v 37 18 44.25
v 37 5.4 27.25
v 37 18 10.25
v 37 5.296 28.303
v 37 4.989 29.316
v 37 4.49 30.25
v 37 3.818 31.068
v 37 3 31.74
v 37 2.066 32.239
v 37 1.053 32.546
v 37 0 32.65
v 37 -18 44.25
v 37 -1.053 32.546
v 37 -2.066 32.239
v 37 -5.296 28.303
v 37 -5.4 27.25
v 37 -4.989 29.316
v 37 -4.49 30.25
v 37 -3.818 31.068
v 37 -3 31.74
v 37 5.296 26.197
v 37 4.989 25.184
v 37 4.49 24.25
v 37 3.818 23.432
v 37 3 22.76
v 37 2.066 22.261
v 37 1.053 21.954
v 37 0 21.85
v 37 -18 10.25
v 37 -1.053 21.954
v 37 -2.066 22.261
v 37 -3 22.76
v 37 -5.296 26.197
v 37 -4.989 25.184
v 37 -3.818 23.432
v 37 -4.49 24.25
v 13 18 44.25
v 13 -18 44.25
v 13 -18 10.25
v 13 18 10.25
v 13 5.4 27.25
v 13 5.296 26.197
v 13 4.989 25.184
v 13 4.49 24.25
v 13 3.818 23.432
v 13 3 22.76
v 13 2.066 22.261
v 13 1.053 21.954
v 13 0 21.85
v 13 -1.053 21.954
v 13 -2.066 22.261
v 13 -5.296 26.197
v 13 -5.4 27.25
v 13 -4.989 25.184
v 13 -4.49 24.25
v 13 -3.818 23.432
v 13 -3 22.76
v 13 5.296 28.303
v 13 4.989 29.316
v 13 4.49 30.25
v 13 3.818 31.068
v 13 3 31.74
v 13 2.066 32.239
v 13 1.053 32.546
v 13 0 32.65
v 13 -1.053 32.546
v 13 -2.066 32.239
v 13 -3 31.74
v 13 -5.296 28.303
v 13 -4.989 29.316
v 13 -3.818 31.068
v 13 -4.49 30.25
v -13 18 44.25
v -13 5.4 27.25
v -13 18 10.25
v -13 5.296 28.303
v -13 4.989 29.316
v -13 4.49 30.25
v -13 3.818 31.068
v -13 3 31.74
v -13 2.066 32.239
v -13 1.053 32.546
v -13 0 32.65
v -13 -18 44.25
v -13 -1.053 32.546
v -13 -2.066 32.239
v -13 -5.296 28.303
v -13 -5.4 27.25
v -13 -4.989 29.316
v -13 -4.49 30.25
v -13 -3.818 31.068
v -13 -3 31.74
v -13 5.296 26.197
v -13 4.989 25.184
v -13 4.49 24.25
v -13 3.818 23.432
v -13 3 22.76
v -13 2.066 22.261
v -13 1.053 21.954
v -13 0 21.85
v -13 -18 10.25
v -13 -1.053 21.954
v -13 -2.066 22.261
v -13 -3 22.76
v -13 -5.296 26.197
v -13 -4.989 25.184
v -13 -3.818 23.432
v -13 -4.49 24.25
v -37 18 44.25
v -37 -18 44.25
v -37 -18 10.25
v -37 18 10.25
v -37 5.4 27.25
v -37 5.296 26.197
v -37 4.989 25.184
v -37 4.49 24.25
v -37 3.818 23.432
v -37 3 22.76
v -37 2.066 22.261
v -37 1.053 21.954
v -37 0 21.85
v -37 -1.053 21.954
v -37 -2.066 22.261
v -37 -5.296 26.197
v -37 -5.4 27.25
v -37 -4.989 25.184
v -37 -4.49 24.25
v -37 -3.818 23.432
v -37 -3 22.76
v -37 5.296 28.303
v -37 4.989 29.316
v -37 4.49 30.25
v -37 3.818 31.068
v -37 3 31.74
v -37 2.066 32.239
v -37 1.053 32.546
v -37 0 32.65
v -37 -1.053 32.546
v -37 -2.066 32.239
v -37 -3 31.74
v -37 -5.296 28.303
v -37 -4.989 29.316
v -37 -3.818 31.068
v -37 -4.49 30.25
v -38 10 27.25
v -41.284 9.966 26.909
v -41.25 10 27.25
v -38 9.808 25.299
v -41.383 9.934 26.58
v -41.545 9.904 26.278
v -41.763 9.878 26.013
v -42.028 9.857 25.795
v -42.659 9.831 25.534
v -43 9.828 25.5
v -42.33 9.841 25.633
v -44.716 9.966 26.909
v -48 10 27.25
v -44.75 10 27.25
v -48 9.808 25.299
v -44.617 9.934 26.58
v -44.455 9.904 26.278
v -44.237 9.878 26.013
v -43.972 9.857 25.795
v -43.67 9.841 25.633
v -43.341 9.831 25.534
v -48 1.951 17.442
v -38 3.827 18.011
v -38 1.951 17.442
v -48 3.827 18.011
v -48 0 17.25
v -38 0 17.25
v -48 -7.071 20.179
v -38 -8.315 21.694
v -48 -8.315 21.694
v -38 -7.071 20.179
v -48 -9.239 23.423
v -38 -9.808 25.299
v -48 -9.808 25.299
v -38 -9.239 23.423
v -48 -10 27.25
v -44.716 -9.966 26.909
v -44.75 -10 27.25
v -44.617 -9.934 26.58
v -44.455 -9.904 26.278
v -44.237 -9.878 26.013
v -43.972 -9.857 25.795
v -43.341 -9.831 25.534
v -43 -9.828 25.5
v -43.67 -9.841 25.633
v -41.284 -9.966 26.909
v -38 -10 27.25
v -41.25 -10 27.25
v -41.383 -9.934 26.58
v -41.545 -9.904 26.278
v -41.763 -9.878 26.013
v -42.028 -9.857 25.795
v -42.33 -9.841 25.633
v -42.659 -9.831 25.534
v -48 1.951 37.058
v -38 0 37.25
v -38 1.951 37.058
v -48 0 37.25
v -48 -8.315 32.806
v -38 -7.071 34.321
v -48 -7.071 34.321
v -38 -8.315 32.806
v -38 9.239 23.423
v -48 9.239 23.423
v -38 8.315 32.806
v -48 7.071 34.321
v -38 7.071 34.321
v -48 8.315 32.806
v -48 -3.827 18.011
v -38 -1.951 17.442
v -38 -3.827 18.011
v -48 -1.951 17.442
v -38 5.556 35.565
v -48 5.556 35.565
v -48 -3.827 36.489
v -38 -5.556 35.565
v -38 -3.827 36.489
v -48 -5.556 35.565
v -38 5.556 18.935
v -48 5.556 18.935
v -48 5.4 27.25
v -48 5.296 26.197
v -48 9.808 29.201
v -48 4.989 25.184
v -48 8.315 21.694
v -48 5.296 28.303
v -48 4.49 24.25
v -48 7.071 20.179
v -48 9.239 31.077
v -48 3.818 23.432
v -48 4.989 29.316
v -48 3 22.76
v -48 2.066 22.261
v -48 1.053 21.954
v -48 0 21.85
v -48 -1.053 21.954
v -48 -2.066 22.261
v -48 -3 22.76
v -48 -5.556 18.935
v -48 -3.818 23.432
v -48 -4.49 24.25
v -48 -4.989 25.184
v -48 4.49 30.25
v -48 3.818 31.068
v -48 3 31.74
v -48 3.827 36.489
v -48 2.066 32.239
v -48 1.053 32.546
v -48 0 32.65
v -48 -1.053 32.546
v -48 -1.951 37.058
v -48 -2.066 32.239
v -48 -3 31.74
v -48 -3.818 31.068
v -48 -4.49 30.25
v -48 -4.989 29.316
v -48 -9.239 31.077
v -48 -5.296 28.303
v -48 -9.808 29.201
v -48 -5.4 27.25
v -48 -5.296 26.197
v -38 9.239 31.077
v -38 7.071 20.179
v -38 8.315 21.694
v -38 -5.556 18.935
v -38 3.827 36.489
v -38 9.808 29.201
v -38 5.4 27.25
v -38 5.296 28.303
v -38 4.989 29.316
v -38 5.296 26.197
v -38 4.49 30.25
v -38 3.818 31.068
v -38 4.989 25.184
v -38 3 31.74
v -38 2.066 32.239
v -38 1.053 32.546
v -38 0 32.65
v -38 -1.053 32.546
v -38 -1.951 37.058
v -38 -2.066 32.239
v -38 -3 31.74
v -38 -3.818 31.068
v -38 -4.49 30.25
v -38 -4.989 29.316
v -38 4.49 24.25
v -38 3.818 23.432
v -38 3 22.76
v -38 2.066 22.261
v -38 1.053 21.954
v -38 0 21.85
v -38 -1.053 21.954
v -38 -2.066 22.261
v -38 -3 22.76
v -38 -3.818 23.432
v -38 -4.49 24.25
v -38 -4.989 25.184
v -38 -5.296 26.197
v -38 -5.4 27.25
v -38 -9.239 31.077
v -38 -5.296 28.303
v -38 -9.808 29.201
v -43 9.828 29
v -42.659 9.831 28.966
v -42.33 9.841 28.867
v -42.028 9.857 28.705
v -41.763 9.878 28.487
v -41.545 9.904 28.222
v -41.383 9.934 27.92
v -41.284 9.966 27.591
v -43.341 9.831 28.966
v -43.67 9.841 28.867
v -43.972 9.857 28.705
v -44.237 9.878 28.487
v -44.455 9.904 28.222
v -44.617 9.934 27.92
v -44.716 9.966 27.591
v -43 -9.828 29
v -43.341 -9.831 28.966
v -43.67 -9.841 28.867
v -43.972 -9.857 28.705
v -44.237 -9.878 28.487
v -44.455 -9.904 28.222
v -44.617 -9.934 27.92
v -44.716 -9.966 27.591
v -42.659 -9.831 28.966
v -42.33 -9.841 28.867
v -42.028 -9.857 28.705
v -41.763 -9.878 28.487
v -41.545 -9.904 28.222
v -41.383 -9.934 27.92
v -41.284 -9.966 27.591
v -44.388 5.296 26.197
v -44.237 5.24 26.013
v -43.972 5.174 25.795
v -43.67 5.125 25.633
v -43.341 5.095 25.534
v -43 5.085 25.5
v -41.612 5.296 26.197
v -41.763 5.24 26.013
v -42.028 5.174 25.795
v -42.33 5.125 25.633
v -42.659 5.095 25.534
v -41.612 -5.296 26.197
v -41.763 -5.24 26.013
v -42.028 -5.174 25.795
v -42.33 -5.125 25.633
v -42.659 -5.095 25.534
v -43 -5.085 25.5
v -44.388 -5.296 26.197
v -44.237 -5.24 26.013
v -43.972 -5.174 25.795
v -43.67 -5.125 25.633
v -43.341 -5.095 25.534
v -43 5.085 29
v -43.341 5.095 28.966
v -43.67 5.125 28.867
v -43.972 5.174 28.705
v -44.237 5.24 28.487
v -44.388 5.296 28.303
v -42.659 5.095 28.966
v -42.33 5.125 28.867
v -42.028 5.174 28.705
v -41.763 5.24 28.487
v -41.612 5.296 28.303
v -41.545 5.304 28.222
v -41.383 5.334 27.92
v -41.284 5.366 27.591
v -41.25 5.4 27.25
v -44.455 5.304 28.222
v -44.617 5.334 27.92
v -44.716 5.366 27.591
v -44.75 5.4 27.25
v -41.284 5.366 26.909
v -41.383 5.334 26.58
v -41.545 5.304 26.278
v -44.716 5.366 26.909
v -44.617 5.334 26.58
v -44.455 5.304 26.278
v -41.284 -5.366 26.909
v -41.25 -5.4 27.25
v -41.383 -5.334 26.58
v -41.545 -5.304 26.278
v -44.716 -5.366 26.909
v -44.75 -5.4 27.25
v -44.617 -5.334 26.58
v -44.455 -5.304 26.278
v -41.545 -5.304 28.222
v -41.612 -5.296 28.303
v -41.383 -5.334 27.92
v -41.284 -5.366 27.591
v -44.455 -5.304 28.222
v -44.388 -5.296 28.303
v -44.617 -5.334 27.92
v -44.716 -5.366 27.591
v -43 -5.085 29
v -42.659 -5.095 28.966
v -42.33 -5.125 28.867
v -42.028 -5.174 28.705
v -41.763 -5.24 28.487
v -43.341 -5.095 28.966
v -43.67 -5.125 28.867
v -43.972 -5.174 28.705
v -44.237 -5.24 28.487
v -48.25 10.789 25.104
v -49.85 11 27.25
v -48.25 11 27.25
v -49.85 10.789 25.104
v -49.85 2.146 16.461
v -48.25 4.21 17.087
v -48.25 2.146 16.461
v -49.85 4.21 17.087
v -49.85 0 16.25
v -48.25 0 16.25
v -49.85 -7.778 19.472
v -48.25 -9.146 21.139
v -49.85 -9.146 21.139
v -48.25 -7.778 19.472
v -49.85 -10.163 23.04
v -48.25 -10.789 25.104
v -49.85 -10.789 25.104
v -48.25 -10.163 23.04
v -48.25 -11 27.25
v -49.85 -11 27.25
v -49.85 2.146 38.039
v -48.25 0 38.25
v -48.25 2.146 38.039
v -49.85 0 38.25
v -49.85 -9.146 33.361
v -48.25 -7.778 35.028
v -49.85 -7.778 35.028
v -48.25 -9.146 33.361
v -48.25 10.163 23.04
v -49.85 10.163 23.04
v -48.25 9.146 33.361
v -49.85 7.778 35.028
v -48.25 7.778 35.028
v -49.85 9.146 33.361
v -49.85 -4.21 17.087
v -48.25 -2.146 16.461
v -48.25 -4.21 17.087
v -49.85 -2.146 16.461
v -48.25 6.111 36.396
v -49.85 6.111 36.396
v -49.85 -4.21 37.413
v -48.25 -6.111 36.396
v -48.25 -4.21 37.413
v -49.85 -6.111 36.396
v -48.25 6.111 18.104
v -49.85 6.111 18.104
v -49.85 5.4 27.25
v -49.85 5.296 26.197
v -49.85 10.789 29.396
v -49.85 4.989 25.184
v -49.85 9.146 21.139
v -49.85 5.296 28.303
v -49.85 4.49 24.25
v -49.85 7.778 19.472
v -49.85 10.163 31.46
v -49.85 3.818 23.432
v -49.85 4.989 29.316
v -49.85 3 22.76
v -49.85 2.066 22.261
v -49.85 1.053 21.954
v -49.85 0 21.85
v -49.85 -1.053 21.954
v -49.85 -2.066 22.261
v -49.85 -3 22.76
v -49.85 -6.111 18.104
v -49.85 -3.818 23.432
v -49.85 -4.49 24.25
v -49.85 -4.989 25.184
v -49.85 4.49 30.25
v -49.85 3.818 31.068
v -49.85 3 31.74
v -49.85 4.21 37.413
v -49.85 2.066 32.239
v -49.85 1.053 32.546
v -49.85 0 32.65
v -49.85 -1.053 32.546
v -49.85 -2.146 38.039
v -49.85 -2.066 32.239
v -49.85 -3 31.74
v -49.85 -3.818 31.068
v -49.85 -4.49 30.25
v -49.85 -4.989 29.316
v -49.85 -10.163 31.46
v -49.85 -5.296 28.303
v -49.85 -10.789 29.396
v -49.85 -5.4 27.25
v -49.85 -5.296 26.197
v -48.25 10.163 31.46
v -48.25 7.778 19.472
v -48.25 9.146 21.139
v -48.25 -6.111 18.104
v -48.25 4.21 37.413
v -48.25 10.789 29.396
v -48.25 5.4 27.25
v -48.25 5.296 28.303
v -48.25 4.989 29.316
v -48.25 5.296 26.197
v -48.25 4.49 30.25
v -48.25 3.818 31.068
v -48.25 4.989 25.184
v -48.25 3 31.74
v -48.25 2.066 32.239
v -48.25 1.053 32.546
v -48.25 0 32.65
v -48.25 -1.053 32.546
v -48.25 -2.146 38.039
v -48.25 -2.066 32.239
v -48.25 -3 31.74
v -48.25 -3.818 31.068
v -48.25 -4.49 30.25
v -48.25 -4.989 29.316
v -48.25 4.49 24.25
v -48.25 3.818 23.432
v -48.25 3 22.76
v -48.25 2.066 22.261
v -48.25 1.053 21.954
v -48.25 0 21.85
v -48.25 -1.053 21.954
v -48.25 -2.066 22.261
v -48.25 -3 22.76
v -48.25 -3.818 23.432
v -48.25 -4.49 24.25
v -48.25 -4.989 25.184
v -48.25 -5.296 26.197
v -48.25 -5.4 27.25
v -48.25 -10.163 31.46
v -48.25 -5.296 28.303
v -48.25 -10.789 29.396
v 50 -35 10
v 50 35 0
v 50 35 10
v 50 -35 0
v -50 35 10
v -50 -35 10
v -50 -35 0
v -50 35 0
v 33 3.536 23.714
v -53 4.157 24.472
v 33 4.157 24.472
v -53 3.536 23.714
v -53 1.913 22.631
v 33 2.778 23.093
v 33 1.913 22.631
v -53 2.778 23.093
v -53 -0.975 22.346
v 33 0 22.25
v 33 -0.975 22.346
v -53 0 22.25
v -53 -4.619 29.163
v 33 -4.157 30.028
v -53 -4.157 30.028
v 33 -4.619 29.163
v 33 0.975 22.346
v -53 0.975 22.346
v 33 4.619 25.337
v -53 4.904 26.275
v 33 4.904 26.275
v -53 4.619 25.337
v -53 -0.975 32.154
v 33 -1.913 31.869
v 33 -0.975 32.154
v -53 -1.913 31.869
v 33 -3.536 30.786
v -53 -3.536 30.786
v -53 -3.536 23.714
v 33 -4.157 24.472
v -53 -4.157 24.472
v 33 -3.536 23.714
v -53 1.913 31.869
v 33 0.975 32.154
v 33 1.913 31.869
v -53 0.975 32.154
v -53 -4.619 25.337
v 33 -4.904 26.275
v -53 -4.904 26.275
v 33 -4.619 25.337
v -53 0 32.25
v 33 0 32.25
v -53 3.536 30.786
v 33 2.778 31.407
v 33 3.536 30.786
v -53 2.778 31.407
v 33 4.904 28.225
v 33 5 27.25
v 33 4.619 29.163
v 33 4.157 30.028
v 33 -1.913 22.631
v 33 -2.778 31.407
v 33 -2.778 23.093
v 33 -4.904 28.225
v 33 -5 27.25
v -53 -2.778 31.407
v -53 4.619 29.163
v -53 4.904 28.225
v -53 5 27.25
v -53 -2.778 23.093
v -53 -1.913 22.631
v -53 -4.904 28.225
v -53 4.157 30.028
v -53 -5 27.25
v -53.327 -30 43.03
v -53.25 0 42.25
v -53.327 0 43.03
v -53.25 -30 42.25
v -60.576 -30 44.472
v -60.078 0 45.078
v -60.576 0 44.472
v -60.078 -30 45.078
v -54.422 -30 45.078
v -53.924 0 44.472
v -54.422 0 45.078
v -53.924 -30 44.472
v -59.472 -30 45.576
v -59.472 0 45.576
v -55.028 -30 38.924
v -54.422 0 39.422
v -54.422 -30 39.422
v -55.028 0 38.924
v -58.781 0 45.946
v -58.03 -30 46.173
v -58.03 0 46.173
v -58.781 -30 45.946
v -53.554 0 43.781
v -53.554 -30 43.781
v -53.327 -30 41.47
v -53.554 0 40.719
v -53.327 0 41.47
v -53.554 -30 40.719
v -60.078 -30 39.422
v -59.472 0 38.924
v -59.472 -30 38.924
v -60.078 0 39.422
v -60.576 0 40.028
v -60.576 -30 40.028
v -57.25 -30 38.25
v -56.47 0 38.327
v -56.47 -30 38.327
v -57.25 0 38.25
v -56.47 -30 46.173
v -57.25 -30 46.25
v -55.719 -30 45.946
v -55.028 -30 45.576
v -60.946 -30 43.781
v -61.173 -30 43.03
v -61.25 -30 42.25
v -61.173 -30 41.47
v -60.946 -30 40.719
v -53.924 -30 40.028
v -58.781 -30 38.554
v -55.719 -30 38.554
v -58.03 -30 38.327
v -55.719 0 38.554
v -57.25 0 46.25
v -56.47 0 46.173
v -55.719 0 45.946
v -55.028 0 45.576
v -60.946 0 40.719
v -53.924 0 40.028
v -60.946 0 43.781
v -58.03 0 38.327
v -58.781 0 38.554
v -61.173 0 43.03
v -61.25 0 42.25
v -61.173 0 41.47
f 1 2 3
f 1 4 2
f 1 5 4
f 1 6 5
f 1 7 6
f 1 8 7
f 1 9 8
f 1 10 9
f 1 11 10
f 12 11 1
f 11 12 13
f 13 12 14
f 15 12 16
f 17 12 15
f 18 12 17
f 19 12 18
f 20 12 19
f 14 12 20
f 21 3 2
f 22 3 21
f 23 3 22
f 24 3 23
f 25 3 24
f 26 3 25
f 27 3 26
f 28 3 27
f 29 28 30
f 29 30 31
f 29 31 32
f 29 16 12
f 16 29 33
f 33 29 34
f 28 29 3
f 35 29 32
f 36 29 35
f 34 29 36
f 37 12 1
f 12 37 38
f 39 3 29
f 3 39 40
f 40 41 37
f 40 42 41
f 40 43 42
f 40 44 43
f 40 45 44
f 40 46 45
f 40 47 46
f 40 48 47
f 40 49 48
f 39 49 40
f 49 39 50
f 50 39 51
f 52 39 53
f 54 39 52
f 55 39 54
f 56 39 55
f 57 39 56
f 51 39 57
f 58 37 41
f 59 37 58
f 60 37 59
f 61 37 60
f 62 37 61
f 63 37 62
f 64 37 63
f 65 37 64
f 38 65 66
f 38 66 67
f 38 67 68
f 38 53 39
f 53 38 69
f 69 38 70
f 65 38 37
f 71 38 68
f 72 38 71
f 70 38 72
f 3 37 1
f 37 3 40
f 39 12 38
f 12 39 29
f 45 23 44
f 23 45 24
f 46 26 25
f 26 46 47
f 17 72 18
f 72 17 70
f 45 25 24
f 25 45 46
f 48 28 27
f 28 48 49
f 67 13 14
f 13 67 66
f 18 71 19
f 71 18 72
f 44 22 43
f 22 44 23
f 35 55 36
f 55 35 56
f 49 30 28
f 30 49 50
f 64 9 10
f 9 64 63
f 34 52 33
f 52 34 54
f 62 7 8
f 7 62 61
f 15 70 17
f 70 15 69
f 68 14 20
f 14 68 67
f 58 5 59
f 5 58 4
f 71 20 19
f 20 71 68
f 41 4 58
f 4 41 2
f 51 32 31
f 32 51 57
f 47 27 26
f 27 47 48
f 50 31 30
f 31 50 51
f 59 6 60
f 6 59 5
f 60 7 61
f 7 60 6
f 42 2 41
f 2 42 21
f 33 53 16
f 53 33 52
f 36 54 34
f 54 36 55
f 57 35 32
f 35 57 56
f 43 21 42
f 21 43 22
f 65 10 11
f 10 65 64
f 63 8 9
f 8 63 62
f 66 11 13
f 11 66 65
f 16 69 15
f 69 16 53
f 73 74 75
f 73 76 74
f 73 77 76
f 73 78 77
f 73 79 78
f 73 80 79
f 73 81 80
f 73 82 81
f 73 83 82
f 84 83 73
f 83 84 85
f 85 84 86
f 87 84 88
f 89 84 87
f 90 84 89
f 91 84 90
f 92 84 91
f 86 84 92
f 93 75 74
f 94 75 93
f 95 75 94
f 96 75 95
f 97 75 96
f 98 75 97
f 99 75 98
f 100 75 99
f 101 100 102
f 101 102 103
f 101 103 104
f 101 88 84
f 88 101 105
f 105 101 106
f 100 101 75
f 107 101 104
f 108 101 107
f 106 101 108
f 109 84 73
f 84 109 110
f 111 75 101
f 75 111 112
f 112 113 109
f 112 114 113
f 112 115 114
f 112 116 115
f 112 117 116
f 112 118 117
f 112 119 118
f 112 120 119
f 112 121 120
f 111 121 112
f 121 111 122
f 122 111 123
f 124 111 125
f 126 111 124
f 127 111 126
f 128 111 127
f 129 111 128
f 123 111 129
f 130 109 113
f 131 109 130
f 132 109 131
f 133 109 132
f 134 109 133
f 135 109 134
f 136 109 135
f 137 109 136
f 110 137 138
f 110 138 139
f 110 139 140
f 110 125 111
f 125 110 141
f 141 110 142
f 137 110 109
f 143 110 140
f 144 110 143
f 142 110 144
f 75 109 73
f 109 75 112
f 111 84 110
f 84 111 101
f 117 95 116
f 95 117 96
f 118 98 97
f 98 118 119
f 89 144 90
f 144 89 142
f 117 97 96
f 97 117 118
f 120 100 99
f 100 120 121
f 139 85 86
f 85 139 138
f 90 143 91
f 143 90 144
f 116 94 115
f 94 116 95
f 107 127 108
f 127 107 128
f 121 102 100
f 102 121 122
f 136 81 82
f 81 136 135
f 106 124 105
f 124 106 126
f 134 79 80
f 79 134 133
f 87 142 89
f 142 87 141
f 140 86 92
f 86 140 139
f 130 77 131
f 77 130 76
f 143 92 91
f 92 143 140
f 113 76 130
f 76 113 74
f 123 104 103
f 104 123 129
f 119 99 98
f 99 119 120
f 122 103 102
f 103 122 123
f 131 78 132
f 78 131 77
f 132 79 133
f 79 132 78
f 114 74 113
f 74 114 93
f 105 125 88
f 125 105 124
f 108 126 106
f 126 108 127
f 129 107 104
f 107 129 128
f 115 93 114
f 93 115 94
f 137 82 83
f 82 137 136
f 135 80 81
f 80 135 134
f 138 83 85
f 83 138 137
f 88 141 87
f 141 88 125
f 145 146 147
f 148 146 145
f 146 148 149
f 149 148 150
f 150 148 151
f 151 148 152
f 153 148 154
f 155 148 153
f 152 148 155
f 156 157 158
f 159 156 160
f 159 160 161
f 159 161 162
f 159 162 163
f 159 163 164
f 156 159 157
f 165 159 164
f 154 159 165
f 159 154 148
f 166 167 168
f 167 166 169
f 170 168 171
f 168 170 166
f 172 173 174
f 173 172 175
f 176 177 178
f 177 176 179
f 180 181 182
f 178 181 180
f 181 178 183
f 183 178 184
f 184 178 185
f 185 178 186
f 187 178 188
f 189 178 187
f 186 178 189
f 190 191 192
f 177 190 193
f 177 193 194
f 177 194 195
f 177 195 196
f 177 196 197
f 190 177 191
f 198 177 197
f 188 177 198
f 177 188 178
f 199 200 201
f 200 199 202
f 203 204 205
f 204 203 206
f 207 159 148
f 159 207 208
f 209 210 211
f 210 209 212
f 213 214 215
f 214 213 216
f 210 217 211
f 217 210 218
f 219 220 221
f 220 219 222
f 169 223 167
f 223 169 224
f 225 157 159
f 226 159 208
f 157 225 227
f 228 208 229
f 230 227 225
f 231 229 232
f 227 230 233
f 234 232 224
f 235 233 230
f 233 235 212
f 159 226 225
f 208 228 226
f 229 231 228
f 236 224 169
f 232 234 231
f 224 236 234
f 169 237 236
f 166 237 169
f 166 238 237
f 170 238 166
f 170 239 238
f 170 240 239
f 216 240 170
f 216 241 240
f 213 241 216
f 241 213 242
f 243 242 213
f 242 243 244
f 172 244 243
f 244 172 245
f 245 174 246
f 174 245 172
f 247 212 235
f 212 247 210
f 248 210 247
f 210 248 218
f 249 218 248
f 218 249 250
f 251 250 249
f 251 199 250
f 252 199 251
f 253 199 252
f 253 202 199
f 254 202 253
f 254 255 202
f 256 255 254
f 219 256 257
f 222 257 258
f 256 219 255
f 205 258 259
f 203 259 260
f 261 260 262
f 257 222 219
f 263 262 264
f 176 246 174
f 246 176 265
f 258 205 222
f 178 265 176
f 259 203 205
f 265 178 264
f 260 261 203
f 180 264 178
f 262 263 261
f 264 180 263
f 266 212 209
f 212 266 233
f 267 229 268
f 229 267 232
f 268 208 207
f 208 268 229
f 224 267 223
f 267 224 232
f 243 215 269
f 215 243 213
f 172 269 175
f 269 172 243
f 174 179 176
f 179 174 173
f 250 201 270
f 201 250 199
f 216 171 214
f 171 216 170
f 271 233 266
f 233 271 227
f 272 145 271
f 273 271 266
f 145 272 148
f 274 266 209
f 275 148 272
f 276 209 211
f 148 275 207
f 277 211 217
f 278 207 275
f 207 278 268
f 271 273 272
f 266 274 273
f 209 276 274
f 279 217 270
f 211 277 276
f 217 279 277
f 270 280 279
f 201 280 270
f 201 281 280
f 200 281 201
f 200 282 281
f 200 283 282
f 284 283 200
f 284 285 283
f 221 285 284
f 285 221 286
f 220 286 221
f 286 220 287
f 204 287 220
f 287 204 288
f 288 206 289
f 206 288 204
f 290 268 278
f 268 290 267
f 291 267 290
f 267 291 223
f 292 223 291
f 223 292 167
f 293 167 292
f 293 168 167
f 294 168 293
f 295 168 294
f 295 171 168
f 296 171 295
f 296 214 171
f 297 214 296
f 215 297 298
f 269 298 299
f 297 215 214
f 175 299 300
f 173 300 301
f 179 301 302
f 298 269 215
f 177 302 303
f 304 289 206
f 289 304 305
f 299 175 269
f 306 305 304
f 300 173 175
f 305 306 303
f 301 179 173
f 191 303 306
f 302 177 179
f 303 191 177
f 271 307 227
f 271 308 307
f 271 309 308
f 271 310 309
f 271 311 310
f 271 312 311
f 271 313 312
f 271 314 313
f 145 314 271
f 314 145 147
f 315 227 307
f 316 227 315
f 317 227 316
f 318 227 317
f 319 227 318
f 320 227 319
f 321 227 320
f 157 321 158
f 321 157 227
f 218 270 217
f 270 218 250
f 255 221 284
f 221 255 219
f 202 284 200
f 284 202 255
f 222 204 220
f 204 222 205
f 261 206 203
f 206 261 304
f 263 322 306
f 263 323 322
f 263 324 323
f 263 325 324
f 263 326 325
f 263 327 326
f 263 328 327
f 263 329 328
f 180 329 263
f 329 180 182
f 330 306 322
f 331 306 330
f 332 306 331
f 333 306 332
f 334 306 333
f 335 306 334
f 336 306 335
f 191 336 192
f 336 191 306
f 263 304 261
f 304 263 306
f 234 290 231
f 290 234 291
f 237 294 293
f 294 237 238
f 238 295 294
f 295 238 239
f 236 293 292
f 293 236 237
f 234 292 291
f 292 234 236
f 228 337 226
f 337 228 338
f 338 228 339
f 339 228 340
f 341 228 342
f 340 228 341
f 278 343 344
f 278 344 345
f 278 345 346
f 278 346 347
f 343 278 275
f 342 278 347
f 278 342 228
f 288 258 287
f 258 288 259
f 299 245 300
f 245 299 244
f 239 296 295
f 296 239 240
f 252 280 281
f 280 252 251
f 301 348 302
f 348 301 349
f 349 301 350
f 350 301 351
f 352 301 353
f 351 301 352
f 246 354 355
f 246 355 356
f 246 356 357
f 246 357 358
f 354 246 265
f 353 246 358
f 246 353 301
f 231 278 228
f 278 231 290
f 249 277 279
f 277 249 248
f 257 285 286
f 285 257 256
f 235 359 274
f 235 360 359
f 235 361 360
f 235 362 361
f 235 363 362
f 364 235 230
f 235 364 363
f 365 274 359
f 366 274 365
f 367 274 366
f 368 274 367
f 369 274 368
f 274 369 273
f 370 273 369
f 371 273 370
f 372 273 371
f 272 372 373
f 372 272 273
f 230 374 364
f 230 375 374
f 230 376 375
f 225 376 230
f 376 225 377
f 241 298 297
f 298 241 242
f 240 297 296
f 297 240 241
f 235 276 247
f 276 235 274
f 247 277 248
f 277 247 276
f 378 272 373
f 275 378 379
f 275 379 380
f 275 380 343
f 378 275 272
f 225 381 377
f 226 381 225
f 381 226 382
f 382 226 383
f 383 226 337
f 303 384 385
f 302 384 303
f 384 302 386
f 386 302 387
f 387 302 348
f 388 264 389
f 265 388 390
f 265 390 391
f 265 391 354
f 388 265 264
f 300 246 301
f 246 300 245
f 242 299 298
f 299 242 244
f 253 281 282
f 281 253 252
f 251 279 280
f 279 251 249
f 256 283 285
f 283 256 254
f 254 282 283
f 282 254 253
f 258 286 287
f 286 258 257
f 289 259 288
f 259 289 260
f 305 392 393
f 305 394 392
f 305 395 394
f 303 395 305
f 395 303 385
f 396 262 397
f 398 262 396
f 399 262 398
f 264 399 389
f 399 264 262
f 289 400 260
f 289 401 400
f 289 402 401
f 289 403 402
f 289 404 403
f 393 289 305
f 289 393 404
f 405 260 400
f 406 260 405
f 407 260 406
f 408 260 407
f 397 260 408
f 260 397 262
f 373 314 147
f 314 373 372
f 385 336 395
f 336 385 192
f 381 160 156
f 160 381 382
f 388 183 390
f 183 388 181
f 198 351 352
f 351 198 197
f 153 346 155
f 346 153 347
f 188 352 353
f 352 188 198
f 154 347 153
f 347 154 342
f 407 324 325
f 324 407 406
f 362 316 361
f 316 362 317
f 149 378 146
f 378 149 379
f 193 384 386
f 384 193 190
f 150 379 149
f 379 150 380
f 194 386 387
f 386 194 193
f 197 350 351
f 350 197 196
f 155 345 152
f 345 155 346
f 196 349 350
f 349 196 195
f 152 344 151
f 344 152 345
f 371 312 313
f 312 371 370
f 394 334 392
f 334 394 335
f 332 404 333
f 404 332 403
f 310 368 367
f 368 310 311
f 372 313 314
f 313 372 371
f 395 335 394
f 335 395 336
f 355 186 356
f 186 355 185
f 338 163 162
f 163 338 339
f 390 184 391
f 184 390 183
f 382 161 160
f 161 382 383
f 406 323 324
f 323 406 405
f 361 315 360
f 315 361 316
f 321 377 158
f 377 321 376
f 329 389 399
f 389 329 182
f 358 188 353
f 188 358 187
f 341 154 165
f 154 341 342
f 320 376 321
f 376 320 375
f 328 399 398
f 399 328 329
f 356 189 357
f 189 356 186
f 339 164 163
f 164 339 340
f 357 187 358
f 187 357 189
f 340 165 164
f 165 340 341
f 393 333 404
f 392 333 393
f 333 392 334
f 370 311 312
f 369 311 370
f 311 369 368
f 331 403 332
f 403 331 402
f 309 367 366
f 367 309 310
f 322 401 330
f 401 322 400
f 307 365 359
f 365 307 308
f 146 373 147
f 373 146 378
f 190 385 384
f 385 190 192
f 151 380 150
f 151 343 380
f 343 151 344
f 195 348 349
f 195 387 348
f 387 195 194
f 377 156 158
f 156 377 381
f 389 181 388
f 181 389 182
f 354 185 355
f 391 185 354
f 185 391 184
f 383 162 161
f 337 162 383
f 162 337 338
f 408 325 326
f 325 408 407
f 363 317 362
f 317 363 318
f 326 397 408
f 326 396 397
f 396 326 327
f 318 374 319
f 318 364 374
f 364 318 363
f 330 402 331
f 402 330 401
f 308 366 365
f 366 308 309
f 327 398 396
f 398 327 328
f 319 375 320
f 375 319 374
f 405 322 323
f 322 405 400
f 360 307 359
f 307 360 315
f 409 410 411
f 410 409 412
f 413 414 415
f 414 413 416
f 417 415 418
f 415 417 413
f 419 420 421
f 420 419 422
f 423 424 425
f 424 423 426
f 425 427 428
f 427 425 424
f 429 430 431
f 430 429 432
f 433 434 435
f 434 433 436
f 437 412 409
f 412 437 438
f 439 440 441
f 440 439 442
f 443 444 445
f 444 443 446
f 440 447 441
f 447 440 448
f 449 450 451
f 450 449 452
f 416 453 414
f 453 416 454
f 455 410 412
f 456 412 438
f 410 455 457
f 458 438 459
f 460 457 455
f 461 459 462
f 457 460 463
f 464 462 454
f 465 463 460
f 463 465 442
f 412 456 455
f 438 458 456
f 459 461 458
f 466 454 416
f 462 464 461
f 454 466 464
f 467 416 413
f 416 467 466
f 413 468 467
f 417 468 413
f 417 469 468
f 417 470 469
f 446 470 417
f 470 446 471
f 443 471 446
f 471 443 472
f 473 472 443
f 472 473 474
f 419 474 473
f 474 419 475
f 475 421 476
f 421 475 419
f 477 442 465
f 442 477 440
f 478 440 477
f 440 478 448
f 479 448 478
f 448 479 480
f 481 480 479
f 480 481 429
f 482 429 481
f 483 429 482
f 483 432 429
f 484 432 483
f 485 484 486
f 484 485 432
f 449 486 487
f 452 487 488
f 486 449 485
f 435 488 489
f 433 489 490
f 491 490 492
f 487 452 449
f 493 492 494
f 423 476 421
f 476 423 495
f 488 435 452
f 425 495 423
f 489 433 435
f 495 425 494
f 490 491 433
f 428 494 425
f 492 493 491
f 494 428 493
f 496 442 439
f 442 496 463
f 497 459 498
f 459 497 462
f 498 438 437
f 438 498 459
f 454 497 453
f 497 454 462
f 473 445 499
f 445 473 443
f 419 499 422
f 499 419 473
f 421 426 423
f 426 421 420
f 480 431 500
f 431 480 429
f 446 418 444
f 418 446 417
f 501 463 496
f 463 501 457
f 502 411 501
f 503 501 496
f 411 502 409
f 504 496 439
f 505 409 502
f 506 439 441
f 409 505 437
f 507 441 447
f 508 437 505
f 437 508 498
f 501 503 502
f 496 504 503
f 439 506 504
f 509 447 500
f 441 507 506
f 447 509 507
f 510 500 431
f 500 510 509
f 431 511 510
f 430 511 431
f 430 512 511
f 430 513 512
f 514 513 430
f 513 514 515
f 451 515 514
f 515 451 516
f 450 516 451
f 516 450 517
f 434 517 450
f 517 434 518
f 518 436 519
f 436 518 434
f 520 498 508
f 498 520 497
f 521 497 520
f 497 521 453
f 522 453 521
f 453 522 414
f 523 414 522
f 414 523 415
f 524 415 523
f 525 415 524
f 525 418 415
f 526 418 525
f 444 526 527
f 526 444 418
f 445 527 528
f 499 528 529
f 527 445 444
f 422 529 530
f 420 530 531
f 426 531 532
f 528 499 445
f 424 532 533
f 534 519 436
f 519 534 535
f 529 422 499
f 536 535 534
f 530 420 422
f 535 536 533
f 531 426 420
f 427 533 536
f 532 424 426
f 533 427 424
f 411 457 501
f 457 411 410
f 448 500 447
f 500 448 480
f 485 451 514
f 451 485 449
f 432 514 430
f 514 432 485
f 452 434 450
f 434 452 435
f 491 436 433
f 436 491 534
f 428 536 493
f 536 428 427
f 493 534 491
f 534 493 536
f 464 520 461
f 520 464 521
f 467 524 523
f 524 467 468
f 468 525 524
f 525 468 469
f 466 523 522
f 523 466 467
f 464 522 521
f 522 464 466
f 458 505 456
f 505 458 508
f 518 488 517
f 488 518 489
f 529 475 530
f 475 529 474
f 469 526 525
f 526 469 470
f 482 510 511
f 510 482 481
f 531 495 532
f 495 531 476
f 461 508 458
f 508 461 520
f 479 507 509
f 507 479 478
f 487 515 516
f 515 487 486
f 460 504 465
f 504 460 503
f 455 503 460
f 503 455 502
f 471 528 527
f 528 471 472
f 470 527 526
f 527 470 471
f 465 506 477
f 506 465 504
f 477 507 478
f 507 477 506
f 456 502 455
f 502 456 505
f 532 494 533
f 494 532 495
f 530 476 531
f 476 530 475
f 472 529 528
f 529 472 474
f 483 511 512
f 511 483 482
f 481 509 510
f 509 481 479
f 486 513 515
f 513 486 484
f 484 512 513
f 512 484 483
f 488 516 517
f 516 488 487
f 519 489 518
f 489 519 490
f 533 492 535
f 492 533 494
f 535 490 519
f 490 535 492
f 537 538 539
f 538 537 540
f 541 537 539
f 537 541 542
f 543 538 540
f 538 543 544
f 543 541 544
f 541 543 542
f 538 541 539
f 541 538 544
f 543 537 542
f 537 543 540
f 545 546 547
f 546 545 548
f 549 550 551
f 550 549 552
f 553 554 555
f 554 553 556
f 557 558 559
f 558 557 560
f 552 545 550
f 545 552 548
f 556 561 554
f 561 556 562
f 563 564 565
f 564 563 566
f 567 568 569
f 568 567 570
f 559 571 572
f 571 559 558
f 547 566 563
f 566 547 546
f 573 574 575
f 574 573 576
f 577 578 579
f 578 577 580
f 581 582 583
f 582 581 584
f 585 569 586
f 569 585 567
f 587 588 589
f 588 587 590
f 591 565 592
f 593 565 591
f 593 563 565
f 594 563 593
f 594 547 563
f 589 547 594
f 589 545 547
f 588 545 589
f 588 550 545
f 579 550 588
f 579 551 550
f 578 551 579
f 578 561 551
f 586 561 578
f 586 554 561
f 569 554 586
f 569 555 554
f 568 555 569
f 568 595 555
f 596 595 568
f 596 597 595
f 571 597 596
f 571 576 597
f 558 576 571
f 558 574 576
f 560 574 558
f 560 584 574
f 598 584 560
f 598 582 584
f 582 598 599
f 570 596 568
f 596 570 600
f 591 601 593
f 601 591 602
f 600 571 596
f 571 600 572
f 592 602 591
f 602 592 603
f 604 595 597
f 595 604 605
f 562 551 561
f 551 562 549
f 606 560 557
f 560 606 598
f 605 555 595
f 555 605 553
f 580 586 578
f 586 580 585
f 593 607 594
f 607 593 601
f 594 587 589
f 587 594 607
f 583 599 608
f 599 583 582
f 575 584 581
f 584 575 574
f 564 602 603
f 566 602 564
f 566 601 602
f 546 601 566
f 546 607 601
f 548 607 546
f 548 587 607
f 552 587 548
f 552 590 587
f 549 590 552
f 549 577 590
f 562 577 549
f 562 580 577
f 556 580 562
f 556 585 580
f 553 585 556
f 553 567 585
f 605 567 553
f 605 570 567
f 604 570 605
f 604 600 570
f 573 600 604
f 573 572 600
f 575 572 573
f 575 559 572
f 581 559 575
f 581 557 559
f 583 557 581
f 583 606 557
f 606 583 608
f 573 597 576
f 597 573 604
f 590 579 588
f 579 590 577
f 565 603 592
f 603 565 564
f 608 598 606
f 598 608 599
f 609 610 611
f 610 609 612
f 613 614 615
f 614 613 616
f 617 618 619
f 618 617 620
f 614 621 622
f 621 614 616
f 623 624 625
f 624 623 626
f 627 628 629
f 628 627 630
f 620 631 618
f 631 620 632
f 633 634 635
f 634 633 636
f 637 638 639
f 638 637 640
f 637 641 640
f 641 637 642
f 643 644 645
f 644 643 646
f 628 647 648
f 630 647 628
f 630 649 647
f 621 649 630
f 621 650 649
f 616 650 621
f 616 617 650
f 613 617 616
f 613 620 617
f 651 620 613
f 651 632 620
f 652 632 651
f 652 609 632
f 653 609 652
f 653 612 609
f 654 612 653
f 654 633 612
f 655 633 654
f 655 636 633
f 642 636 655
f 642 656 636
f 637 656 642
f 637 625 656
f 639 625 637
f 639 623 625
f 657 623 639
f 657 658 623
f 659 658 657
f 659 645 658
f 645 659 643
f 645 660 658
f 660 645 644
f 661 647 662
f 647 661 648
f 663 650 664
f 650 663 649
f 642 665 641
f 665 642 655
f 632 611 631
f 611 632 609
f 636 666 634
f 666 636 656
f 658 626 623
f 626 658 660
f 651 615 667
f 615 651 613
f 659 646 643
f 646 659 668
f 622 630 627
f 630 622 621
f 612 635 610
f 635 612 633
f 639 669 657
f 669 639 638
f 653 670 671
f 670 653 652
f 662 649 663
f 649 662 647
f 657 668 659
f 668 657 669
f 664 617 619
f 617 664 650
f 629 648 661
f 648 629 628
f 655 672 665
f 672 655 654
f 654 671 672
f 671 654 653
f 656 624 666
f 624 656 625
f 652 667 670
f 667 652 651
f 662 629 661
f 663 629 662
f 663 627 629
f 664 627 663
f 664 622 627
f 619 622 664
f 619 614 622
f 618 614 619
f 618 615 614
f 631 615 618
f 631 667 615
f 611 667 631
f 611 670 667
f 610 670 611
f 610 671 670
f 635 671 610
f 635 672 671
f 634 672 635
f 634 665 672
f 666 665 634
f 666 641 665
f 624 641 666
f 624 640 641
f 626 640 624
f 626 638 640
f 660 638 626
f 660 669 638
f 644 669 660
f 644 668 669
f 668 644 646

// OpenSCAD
$fn = 32;

// ------------------------------------------------------------------------
// Machine vise: screw d10, jaws 24 x 34 mm
// Every part is its own module, assembly() places every instance.
// ------------------------------------------------------------------------

// --- part 1 ---
module vise_bed() {
  difference() {
    translate([-50, -35, 0]) cube([100, 70, 10]);
  }
}

// --- part 2 ---
module vise_jaw() {
  difference() {
    translate([-12, -18, 0]) cube([24, 36, 34]);
    translate([0, 0, 17]) rotate([0, 90, 0]) cylinder(h = 26, d = 10.8, center = true);
  }
}

// --- part 3 ---
module vise_screw() {
  translate([0, 0, -43]) cylinder(h = 86, d = 10);
}

// --- part 4 ---
module screw_collar() {
  difference() {
    cylinder(h = 10, d = 20);
    translate([0, 0, -1]) cylinder(h = 12, d = 10.8);
    translate([0, 0, 5]) rotate([90, 0, 0]) cylinder(h = 22, d = 3.5, center = true);
  }
}

// --- part 5 ---
module screw_washer() {
  difference() {
      translate([0, 0, 0]) cylinder(h = 1.6, d = 22);
      translate([0, 0, -1]) cylinder(h = 3.6, d = 10.8);
    }
}

// --- part 6 ---
module vise_handle() {
  cylinder(h = 30, d = 8);
}

// --- assembly ---
module assembly() {
  color([0.80, 0.24, 0.20]) translate([0, 0, 0]) rotate([0, 0, 0]) vise_bed();
  color([0.20, 0.45, 0.75]) translate([25, 0, 10.25]) rotate([0, 0, 0]) vise_jaw();
  color([0.25, 0.62, 0.32]) translate([-25, 0, 10.25]) rotate([0, 0, 0]) vise_jaw();
  color([0.92, 0.70, 0.18]) translate([-10, 0, 27.25]) rotate([0, 90, 0]) vise_screw();
  color([0.58, 0.35, 0.70]) translate([-48, 0, 27.25]) rotate([0, 90, 0]) screw_collar();
  color([0.16, 0.66, 0.66]) translate([-49.85, 0, 27.25]) rotate([0, 90, 0]) screw_washer();
  color([0.85, 0.48, 0.18]) translate([-57.25, 0, 42.25]) rotate([90, 0, 0]) vise_handle();
}

assembly();
